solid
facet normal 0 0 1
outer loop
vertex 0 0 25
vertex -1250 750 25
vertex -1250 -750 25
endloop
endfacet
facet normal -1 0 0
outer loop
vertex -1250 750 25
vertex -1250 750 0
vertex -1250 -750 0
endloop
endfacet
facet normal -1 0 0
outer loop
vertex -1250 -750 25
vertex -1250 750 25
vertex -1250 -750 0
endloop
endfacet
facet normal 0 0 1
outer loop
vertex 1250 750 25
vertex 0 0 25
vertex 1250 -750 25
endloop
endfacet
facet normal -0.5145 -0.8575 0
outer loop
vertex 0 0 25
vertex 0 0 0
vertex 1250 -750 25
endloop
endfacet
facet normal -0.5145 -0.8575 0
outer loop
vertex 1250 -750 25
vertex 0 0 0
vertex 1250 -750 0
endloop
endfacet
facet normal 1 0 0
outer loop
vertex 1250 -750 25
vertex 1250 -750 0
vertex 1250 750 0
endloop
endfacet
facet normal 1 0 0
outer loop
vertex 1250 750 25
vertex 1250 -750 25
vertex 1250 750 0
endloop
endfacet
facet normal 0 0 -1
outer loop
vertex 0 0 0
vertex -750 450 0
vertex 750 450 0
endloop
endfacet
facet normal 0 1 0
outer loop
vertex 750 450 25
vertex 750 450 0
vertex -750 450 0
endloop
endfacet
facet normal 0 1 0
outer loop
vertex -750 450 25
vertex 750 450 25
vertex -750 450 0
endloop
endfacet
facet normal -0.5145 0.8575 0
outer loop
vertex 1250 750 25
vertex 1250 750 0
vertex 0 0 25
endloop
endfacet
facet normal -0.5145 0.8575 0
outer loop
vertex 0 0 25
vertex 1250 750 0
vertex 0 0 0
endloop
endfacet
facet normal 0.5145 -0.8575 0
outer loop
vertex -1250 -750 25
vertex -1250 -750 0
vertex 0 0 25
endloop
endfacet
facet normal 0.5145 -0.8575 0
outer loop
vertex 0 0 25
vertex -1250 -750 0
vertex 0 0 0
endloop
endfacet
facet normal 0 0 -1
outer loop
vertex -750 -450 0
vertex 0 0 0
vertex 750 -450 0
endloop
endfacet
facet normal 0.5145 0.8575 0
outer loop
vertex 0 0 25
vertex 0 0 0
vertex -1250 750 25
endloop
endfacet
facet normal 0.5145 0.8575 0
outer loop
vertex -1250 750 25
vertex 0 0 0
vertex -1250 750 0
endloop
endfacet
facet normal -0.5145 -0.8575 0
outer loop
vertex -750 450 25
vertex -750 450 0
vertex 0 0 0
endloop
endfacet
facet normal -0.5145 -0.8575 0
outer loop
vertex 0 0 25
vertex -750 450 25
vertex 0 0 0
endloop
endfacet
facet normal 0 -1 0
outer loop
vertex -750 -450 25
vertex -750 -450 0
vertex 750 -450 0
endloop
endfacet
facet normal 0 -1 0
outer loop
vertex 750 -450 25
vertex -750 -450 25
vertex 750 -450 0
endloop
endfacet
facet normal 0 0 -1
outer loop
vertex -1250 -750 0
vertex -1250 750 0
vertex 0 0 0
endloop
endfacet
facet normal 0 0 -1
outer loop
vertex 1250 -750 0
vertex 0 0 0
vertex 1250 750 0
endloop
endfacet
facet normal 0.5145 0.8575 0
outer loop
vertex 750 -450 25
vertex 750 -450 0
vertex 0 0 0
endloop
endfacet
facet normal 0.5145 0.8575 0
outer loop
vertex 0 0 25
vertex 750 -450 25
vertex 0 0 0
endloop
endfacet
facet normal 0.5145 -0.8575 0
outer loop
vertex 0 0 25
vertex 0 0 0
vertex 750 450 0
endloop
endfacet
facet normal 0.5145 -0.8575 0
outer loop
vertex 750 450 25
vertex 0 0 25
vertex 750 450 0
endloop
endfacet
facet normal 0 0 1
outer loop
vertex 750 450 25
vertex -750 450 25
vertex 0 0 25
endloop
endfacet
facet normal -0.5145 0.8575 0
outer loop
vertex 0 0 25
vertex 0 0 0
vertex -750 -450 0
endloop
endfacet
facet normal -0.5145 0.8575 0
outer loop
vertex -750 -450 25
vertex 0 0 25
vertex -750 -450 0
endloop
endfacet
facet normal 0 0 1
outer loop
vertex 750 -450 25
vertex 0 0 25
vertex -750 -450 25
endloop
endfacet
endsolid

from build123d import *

# Parameters (mm, degrees)
F2_DEPTH = 25
F3_DEPTH = 25


with BuildPart() as f2:
    # F1 (on Top) → F2 (new body)
    with BuildSketch(Plane.XY):
        Polygon((750, -450), (1250, -750), (1250, -450), align=None)
        Polygon((750, 450), (1250, 450), (1250, 750), align=None)
        Polygon((750, -450), (1250, -450), (1250, 450), (750, 450), (0, 0), align=None)
    extrude(amount=F2_DEPTH)


with BuildPart() as f2b:
    # F1 (on Top) → F2, piece 2 (new body)
    with BuildSketch(Plane.XY):
        Polygon((-1250, -450), (-1250, -750), (-750, -450), align=None)
        Polygon((-1250, 750), (-1250, 450), (-750, 450), align=None)
        Polygon((-1250, 450), (-1250, -450), (-750, -450), (0, 0), (-750, 450), align=None)
    extrude(amount=F2_DEPTH)


with BuildPart() as f3:
    # F1 (on Top) → F3 (new body)
    with BuildSketch(Plane.XY):
        Polygon((-750, 450), (0, 0), (750, 450), align=None)
    extrude(amount=F3_DEPTH)


with BuildPart() as f3b:
    # F1 (on Top) → F3, piece 2 (new body)
    with BuildSketch(Plane.XY):
        Polygon((-750, -450), (750, -450), (0, 0), align=None)
    extrude(amount=F3_DEPTH)


solid = Compound([f2.part, f2b.part, f3.part, f3b.part])
